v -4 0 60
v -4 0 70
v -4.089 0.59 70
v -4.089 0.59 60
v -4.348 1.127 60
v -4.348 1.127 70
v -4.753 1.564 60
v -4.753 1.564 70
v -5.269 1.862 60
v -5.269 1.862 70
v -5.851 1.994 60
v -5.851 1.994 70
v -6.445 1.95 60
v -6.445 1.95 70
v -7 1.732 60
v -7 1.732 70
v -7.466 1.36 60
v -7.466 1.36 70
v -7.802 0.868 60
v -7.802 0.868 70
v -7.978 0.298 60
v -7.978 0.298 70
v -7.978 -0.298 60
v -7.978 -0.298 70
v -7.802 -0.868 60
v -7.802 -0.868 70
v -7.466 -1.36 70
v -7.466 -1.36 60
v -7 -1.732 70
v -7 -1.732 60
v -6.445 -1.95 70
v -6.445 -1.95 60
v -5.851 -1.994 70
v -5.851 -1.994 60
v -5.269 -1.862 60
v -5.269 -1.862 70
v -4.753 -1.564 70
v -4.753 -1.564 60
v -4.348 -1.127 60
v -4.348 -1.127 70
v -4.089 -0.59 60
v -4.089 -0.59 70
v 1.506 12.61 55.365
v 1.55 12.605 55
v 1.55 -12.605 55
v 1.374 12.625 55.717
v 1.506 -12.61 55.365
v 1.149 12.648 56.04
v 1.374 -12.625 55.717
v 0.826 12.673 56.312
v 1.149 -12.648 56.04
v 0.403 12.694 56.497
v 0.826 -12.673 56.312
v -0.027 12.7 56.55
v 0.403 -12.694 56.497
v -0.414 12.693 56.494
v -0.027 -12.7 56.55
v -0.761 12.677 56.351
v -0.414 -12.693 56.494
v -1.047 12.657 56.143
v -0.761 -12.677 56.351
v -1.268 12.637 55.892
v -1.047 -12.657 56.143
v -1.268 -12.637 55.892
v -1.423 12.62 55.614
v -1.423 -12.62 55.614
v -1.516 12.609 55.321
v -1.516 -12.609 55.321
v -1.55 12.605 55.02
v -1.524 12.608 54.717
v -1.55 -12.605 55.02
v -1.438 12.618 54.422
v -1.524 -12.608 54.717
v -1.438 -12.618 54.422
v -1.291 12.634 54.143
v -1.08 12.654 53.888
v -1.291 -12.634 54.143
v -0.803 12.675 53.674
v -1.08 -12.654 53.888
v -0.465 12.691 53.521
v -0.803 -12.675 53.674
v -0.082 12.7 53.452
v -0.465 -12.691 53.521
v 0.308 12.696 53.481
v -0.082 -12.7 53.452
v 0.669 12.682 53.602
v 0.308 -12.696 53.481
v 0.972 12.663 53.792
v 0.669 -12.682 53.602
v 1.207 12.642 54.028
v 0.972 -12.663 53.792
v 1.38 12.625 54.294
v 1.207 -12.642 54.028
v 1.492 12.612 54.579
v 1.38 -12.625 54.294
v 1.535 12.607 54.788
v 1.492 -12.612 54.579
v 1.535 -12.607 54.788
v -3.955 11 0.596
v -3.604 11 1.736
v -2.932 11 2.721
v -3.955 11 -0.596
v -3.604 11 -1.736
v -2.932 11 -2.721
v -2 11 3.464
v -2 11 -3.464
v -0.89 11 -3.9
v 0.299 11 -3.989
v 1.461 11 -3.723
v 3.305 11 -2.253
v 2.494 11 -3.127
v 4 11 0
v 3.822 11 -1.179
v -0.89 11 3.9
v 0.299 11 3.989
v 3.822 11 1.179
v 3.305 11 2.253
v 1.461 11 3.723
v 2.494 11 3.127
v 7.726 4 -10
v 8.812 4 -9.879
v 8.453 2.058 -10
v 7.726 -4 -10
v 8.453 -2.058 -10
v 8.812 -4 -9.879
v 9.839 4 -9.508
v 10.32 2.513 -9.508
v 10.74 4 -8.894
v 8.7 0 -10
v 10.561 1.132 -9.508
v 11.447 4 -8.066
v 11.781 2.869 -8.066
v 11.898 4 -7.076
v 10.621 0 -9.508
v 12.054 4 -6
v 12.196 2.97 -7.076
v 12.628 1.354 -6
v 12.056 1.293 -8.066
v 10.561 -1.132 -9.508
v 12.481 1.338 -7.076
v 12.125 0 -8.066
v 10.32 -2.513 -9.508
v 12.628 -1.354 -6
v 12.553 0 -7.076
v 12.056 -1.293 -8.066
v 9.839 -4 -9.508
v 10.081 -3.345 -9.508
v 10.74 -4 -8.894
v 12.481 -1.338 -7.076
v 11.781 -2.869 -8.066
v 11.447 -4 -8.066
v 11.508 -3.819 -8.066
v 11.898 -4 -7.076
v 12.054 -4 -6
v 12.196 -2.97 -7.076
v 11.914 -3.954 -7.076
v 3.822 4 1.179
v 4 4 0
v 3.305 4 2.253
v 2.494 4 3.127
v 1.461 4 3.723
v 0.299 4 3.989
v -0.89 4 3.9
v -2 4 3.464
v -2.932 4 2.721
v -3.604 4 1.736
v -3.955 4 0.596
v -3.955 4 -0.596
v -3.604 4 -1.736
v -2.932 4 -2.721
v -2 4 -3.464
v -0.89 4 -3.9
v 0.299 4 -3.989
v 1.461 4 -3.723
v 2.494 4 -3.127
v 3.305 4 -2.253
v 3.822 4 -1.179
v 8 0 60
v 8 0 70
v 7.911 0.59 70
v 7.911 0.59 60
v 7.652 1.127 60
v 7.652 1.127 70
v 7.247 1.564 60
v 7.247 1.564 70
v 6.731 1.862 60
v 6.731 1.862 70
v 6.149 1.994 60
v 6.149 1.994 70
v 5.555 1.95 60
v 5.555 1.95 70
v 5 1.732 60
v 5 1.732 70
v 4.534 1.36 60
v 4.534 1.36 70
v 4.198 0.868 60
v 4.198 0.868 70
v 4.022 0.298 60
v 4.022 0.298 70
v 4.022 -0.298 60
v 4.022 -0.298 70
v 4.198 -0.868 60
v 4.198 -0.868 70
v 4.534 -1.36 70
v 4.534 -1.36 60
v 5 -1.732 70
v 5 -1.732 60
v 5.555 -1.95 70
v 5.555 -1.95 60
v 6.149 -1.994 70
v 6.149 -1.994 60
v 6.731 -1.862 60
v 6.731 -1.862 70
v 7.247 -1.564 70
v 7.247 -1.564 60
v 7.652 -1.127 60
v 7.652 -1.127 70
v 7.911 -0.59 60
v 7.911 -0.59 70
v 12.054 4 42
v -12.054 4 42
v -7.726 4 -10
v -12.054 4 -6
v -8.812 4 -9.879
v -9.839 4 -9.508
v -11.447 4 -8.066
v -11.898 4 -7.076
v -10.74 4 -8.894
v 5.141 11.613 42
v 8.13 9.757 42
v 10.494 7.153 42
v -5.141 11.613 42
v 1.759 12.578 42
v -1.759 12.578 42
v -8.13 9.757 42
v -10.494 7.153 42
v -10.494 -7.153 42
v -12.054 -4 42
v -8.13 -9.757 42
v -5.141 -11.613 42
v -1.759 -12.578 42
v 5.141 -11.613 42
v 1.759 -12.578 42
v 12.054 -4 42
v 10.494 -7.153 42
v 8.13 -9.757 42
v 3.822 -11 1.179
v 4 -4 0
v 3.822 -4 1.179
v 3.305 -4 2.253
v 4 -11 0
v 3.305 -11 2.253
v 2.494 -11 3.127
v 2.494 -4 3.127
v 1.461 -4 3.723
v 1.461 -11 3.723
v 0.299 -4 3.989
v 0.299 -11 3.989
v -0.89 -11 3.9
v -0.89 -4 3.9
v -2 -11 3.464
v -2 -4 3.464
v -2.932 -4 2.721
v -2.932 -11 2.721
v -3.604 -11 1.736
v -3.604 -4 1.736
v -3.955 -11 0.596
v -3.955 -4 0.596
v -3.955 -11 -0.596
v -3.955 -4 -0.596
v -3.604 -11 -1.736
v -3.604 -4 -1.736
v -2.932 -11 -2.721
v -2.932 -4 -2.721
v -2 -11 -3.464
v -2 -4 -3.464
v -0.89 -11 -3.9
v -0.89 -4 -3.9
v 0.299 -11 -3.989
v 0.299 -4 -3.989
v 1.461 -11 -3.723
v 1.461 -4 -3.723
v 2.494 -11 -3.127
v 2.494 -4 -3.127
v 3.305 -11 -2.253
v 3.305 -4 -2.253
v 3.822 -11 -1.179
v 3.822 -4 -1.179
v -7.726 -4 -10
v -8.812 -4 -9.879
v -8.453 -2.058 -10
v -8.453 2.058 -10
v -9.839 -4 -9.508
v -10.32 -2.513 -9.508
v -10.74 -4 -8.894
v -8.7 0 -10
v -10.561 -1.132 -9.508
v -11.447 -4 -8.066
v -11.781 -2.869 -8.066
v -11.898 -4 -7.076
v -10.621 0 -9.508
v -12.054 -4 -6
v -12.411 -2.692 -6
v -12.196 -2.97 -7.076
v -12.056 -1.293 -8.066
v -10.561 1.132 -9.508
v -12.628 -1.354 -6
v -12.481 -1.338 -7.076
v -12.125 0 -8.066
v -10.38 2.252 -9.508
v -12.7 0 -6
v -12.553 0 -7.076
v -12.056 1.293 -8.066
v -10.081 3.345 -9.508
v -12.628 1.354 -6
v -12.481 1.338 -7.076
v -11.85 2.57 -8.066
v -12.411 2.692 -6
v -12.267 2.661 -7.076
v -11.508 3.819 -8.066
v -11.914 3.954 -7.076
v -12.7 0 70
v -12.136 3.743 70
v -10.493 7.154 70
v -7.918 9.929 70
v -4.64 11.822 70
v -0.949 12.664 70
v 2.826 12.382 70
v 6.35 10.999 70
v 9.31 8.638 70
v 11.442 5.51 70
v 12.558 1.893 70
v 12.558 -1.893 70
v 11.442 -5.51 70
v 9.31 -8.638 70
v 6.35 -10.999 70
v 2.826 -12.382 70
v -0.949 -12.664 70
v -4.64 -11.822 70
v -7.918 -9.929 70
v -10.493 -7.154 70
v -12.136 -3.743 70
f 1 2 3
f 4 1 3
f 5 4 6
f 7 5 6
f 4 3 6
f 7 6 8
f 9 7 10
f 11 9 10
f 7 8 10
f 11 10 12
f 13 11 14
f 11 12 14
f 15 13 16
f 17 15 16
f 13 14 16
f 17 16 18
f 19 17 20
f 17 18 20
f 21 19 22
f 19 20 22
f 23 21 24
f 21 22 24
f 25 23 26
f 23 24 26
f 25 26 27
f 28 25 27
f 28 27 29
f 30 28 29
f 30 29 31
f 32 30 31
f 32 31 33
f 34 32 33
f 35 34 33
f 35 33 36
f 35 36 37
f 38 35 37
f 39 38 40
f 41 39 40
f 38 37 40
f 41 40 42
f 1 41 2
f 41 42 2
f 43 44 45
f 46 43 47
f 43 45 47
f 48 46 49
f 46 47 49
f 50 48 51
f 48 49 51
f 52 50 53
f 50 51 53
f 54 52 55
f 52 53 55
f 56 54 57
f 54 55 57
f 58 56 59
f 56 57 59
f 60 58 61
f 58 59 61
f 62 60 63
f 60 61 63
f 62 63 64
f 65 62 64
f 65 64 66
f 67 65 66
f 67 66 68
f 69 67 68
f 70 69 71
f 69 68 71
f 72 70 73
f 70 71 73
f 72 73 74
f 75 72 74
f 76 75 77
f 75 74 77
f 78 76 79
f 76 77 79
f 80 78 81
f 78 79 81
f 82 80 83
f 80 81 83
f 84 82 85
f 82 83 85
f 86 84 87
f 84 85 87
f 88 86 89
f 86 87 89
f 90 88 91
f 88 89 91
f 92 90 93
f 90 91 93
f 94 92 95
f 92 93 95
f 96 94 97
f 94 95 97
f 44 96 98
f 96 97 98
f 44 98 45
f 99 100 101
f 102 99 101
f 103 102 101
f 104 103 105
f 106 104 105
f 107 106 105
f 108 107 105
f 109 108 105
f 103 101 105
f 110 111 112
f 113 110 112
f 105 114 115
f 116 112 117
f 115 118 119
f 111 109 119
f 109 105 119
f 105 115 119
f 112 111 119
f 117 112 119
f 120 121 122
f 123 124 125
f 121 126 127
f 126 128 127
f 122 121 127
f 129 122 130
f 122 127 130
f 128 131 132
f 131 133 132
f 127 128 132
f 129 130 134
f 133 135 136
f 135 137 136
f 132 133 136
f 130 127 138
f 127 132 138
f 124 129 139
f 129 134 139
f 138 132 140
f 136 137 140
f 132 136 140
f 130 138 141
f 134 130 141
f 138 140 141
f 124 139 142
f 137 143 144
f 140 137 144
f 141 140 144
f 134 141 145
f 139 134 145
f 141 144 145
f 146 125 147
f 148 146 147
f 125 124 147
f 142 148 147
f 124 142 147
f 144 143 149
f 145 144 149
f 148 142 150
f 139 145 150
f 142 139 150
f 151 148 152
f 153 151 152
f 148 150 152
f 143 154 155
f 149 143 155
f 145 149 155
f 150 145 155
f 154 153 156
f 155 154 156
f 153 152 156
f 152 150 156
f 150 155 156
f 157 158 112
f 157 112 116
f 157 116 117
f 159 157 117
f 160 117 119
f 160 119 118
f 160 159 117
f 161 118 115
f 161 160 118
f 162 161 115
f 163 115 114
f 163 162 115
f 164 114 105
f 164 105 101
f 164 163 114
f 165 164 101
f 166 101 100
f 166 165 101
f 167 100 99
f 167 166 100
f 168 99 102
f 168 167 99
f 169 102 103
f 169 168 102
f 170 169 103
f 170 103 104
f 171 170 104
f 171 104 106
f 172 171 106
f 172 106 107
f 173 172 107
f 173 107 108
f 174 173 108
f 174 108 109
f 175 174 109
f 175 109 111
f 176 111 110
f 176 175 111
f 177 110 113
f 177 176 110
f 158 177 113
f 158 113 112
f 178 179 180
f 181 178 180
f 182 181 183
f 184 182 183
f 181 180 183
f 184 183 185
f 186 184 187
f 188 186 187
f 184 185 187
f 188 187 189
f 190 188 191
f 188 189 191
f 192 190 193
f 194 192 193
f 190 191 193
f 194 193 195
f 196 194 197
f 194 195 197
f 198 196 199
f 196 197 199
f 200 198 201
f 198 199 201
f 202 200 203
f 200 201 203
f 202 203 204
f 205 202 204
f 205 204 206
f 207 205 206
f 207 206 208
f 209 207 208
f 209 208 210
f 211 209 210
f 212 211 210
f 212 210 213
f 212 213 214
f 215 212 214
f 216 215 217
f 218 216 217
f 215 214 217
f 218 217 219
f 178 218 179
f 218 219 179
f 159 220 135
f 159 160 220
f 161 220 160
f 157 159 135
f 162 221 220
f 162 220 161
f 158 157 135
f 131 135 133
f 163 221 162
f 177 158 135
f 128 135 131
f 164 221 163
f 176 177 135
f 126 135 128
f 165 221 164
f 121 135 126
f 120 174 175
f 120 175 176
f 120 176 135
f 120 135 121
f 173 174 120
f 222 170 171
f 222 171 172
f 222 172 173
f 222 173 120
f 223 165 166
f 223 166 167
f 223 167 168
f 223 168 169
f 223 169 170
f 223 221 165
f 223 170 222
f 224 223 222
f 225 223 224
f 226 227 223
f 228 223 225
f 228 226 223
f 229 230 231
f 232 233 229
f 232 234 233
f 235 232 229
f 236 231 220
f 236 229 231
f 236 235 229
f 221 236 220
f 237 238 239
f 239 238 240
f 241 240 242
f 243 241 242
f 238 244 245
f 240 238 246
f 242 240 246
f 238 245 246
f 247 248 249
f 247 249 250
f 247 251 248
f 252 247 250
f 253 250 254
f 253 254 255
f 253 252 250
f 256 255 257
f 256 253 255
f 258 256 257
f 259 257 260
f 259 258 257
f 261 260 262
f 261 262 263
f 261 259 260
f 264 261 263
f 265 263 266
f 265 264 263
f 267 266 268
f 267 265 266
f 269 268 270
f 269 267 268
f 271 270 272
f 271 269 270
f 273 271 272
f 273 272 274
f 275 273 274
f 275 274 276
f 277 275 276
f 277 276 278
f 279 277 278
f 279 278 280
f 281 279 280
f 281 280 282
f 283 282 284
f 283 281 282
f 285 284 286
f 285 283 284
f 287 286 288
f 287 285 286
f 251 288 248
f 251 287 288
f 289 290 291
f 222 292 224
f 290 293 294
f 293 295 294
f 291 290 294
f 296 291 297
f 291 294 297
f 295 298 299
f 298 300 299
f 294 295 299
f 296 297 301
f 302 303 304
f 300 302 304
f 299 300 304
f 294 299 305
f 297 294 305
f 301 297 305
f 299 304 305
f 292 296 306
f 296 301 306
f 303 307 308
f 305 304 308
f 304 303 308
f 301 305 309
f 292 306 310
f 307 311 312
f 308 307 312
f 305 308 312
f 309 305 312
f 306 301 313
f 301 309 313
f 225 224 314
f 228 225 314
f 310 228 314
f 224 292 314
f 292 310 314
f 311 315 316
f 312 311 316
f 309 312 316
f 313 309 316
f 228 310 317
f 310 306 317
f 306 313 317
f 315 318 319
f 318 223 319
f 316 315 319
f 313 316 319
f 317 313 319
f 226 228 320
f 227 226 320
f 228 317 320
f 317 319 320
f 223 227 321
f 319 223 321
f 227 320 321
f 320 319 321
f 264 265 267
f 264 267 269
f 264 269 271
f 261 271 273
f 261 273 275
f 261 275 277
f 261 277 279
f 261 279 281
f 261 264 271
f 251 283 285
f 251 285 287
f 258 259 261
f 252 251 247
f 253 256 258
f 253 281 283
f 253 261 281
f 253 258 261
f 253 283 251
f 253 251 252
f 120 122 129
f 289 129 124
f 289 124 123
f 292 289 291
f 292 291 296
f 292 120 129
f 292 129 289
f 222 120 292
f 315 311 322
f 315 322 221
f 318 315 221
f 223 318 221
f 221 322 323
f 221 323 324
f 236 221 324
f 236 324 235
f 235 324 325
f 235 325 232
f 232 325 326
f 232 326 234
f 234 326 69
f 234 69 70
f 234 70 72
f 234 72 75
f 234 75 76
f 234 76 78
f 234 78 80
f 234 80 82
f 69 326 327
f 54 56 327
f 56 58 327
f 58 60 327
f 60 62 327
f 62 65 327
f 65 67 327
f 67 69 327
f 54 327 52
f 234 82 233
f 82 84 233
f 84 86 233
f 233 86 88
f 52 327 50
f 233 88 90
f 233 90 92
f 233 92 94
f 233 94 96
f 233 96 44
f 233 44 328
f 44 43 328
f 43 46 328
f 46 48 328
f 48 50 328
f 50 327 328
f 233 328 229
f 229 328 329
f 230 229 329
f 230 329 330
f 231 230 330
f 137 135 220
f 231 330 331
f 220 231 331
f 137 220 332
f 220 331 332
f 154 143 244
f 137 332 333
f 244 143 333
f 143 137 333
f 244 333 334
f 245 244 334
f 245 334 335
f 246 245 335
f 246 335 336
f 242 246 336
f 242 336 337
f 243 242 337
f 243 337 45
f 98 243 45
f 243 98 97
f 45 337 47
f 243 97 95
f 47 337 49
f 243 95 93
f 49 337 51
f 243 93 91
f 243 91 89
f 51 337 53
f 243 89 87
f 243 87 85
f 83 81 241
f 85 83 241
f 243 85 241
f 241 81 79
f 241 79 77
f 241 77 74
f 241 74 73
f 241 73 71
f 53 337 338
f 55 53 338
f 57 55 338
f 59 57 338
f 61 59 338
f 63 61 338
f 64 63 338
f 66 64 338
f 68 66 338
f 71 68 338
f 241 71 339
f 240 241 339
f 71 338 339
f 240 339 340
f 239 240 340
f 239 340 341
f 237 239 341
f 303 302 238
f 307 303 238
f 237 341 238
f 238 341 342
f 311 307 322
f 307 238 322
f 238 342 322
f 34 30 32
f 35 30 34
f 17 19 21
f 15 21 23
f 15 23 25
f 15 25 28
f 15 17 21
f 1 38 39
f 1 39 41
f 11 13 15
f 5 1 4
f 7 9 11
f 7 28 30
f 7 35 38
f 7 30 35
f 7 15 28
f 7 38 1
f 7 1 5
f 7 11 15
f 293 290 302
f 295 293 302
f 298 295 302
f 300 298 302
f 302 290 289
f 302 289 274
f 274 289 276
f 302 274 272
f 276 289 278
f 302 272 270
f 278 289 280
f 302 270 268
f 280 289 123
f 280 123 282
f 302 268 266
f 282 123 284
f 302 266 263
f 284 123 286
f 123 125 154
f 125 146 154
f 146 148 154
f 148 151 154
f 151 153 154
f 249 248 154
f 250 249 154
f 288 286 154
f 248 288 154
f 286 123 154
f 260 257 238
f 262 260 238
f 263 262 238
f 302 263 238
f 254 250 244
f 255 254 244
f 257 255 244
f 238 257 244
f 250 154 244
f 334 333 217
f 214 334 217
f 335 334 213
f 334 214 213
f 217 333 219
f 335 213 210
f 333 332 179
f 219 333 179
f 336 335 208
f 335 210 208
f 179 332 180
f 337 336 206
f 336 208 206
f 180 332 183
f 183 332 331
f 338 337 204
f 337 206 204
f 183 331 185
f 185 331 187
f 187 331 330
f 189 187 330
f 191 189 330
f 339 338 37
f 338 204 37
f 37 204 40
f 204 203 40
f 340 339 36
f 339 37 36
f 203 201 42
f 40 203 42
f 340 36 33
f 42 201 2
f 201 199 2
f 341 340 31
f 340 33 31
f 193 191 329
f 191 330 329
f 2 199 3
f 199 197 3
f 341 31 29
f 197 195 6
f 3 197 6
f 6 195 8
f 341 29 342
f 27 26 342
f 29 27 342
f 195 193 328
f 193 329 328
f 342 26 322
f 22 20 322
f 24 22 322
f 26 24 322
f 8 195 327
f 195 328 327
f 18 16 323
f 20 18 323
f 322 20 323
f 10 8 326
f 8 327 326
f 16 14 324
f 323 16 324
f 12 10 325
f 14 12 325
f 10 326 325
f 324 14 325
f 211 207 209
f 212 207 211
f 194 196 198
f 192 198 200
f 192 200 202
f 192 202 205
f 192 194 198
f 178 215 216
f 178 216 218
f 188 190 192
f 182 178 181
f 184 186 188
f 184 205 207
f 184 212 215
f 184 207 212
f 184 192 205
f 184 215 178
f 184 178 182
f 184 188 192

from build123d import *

# Parameters (mm, degrees)
F0_W           = 12.7
F0_H           = 80
F3_DEPTH       = 12.701
F3_DEPTH_BACK  = 12.701
F4_R           = 4
F5_DEPTH       = 11
F6_R           = 2
F7_DEPTH       = 10
F8_R           = 4
F9_R           = 1.55
F10_DEPTH      = 12.701
F10_DEPTH_BACK = 12.701


with BuildPart() as f1:
    # F0 (on Front) → F1 (revolve)
    with BuildSketch(Plane.XZ):
        with Locations((-6.35, 30)):
            Rectangle(F0_W, F0_H)
    revolve(axis=Axis((0, 0, 30), (0, 0, -1)))

    # F2 (on Right) → F3 (cut, two sides)
    with BuildSketch(Plane.YZ) as f3_sk:
        Polygon((-4, -10), (-4, 42), (-29.7404956073, 42), (-29.7404956073, -22.2334191203), (-4, -22.2334191203), align=None)
        Polygon((40.2332246304, 42), (4, 42), (4, -10), (4, -16.8698504567), (40.2332246304, -16.8698504567), align=None)
    extrude(amount=-F3_DEPTH, mode=Mode.SUBTRACT)
    extrude(f3_sk.sketch, amount=F3_DEPTH_BACK, mode=Mode.SUBTRACT)

    # F4 (on Front) → F5 (join, symmetric)
    with BuildSketch(Plane.XZ):
        Circle(F4_R)
    extrude(amount=F5_DEPTH, both=True)

    # F6 (on face) → F7 (cut)
    with BuildSketch(Plane.XY.offset(70)):
        with Locations((-6, 0)):
            Circle(F6_R)
        with Locations((6, 0)):
            Circle(F6_R)
    extrude(amount=-F7_DEPTH, mode=Mode.SUBTRACT)

    # F8
    f8_edges = [f1.edges().sort_by_distance(p)[0] for p in [
        (12.7, 0, -10),
        (-12.537366, -2.025944, -10),
        (-12.537366, 2.025944, -10),
    ]]
    fillet(f8_edges, radius=F8_R)

    # F9 (on Front) → F10 (cut, two sides)
    with BuildSketch(Plane.XZ) as f10_sk:
        with Locations((0, 55)):
            Circle(F9_R)
    extrude(amount=F10_DEPTH, mode=Mode.SUBTRACT)
    extrude(f10_sk.sketch, amount=-F10_DEPTH_BACK, mode=Mode.SUBTRACT)


solid = f1.part
